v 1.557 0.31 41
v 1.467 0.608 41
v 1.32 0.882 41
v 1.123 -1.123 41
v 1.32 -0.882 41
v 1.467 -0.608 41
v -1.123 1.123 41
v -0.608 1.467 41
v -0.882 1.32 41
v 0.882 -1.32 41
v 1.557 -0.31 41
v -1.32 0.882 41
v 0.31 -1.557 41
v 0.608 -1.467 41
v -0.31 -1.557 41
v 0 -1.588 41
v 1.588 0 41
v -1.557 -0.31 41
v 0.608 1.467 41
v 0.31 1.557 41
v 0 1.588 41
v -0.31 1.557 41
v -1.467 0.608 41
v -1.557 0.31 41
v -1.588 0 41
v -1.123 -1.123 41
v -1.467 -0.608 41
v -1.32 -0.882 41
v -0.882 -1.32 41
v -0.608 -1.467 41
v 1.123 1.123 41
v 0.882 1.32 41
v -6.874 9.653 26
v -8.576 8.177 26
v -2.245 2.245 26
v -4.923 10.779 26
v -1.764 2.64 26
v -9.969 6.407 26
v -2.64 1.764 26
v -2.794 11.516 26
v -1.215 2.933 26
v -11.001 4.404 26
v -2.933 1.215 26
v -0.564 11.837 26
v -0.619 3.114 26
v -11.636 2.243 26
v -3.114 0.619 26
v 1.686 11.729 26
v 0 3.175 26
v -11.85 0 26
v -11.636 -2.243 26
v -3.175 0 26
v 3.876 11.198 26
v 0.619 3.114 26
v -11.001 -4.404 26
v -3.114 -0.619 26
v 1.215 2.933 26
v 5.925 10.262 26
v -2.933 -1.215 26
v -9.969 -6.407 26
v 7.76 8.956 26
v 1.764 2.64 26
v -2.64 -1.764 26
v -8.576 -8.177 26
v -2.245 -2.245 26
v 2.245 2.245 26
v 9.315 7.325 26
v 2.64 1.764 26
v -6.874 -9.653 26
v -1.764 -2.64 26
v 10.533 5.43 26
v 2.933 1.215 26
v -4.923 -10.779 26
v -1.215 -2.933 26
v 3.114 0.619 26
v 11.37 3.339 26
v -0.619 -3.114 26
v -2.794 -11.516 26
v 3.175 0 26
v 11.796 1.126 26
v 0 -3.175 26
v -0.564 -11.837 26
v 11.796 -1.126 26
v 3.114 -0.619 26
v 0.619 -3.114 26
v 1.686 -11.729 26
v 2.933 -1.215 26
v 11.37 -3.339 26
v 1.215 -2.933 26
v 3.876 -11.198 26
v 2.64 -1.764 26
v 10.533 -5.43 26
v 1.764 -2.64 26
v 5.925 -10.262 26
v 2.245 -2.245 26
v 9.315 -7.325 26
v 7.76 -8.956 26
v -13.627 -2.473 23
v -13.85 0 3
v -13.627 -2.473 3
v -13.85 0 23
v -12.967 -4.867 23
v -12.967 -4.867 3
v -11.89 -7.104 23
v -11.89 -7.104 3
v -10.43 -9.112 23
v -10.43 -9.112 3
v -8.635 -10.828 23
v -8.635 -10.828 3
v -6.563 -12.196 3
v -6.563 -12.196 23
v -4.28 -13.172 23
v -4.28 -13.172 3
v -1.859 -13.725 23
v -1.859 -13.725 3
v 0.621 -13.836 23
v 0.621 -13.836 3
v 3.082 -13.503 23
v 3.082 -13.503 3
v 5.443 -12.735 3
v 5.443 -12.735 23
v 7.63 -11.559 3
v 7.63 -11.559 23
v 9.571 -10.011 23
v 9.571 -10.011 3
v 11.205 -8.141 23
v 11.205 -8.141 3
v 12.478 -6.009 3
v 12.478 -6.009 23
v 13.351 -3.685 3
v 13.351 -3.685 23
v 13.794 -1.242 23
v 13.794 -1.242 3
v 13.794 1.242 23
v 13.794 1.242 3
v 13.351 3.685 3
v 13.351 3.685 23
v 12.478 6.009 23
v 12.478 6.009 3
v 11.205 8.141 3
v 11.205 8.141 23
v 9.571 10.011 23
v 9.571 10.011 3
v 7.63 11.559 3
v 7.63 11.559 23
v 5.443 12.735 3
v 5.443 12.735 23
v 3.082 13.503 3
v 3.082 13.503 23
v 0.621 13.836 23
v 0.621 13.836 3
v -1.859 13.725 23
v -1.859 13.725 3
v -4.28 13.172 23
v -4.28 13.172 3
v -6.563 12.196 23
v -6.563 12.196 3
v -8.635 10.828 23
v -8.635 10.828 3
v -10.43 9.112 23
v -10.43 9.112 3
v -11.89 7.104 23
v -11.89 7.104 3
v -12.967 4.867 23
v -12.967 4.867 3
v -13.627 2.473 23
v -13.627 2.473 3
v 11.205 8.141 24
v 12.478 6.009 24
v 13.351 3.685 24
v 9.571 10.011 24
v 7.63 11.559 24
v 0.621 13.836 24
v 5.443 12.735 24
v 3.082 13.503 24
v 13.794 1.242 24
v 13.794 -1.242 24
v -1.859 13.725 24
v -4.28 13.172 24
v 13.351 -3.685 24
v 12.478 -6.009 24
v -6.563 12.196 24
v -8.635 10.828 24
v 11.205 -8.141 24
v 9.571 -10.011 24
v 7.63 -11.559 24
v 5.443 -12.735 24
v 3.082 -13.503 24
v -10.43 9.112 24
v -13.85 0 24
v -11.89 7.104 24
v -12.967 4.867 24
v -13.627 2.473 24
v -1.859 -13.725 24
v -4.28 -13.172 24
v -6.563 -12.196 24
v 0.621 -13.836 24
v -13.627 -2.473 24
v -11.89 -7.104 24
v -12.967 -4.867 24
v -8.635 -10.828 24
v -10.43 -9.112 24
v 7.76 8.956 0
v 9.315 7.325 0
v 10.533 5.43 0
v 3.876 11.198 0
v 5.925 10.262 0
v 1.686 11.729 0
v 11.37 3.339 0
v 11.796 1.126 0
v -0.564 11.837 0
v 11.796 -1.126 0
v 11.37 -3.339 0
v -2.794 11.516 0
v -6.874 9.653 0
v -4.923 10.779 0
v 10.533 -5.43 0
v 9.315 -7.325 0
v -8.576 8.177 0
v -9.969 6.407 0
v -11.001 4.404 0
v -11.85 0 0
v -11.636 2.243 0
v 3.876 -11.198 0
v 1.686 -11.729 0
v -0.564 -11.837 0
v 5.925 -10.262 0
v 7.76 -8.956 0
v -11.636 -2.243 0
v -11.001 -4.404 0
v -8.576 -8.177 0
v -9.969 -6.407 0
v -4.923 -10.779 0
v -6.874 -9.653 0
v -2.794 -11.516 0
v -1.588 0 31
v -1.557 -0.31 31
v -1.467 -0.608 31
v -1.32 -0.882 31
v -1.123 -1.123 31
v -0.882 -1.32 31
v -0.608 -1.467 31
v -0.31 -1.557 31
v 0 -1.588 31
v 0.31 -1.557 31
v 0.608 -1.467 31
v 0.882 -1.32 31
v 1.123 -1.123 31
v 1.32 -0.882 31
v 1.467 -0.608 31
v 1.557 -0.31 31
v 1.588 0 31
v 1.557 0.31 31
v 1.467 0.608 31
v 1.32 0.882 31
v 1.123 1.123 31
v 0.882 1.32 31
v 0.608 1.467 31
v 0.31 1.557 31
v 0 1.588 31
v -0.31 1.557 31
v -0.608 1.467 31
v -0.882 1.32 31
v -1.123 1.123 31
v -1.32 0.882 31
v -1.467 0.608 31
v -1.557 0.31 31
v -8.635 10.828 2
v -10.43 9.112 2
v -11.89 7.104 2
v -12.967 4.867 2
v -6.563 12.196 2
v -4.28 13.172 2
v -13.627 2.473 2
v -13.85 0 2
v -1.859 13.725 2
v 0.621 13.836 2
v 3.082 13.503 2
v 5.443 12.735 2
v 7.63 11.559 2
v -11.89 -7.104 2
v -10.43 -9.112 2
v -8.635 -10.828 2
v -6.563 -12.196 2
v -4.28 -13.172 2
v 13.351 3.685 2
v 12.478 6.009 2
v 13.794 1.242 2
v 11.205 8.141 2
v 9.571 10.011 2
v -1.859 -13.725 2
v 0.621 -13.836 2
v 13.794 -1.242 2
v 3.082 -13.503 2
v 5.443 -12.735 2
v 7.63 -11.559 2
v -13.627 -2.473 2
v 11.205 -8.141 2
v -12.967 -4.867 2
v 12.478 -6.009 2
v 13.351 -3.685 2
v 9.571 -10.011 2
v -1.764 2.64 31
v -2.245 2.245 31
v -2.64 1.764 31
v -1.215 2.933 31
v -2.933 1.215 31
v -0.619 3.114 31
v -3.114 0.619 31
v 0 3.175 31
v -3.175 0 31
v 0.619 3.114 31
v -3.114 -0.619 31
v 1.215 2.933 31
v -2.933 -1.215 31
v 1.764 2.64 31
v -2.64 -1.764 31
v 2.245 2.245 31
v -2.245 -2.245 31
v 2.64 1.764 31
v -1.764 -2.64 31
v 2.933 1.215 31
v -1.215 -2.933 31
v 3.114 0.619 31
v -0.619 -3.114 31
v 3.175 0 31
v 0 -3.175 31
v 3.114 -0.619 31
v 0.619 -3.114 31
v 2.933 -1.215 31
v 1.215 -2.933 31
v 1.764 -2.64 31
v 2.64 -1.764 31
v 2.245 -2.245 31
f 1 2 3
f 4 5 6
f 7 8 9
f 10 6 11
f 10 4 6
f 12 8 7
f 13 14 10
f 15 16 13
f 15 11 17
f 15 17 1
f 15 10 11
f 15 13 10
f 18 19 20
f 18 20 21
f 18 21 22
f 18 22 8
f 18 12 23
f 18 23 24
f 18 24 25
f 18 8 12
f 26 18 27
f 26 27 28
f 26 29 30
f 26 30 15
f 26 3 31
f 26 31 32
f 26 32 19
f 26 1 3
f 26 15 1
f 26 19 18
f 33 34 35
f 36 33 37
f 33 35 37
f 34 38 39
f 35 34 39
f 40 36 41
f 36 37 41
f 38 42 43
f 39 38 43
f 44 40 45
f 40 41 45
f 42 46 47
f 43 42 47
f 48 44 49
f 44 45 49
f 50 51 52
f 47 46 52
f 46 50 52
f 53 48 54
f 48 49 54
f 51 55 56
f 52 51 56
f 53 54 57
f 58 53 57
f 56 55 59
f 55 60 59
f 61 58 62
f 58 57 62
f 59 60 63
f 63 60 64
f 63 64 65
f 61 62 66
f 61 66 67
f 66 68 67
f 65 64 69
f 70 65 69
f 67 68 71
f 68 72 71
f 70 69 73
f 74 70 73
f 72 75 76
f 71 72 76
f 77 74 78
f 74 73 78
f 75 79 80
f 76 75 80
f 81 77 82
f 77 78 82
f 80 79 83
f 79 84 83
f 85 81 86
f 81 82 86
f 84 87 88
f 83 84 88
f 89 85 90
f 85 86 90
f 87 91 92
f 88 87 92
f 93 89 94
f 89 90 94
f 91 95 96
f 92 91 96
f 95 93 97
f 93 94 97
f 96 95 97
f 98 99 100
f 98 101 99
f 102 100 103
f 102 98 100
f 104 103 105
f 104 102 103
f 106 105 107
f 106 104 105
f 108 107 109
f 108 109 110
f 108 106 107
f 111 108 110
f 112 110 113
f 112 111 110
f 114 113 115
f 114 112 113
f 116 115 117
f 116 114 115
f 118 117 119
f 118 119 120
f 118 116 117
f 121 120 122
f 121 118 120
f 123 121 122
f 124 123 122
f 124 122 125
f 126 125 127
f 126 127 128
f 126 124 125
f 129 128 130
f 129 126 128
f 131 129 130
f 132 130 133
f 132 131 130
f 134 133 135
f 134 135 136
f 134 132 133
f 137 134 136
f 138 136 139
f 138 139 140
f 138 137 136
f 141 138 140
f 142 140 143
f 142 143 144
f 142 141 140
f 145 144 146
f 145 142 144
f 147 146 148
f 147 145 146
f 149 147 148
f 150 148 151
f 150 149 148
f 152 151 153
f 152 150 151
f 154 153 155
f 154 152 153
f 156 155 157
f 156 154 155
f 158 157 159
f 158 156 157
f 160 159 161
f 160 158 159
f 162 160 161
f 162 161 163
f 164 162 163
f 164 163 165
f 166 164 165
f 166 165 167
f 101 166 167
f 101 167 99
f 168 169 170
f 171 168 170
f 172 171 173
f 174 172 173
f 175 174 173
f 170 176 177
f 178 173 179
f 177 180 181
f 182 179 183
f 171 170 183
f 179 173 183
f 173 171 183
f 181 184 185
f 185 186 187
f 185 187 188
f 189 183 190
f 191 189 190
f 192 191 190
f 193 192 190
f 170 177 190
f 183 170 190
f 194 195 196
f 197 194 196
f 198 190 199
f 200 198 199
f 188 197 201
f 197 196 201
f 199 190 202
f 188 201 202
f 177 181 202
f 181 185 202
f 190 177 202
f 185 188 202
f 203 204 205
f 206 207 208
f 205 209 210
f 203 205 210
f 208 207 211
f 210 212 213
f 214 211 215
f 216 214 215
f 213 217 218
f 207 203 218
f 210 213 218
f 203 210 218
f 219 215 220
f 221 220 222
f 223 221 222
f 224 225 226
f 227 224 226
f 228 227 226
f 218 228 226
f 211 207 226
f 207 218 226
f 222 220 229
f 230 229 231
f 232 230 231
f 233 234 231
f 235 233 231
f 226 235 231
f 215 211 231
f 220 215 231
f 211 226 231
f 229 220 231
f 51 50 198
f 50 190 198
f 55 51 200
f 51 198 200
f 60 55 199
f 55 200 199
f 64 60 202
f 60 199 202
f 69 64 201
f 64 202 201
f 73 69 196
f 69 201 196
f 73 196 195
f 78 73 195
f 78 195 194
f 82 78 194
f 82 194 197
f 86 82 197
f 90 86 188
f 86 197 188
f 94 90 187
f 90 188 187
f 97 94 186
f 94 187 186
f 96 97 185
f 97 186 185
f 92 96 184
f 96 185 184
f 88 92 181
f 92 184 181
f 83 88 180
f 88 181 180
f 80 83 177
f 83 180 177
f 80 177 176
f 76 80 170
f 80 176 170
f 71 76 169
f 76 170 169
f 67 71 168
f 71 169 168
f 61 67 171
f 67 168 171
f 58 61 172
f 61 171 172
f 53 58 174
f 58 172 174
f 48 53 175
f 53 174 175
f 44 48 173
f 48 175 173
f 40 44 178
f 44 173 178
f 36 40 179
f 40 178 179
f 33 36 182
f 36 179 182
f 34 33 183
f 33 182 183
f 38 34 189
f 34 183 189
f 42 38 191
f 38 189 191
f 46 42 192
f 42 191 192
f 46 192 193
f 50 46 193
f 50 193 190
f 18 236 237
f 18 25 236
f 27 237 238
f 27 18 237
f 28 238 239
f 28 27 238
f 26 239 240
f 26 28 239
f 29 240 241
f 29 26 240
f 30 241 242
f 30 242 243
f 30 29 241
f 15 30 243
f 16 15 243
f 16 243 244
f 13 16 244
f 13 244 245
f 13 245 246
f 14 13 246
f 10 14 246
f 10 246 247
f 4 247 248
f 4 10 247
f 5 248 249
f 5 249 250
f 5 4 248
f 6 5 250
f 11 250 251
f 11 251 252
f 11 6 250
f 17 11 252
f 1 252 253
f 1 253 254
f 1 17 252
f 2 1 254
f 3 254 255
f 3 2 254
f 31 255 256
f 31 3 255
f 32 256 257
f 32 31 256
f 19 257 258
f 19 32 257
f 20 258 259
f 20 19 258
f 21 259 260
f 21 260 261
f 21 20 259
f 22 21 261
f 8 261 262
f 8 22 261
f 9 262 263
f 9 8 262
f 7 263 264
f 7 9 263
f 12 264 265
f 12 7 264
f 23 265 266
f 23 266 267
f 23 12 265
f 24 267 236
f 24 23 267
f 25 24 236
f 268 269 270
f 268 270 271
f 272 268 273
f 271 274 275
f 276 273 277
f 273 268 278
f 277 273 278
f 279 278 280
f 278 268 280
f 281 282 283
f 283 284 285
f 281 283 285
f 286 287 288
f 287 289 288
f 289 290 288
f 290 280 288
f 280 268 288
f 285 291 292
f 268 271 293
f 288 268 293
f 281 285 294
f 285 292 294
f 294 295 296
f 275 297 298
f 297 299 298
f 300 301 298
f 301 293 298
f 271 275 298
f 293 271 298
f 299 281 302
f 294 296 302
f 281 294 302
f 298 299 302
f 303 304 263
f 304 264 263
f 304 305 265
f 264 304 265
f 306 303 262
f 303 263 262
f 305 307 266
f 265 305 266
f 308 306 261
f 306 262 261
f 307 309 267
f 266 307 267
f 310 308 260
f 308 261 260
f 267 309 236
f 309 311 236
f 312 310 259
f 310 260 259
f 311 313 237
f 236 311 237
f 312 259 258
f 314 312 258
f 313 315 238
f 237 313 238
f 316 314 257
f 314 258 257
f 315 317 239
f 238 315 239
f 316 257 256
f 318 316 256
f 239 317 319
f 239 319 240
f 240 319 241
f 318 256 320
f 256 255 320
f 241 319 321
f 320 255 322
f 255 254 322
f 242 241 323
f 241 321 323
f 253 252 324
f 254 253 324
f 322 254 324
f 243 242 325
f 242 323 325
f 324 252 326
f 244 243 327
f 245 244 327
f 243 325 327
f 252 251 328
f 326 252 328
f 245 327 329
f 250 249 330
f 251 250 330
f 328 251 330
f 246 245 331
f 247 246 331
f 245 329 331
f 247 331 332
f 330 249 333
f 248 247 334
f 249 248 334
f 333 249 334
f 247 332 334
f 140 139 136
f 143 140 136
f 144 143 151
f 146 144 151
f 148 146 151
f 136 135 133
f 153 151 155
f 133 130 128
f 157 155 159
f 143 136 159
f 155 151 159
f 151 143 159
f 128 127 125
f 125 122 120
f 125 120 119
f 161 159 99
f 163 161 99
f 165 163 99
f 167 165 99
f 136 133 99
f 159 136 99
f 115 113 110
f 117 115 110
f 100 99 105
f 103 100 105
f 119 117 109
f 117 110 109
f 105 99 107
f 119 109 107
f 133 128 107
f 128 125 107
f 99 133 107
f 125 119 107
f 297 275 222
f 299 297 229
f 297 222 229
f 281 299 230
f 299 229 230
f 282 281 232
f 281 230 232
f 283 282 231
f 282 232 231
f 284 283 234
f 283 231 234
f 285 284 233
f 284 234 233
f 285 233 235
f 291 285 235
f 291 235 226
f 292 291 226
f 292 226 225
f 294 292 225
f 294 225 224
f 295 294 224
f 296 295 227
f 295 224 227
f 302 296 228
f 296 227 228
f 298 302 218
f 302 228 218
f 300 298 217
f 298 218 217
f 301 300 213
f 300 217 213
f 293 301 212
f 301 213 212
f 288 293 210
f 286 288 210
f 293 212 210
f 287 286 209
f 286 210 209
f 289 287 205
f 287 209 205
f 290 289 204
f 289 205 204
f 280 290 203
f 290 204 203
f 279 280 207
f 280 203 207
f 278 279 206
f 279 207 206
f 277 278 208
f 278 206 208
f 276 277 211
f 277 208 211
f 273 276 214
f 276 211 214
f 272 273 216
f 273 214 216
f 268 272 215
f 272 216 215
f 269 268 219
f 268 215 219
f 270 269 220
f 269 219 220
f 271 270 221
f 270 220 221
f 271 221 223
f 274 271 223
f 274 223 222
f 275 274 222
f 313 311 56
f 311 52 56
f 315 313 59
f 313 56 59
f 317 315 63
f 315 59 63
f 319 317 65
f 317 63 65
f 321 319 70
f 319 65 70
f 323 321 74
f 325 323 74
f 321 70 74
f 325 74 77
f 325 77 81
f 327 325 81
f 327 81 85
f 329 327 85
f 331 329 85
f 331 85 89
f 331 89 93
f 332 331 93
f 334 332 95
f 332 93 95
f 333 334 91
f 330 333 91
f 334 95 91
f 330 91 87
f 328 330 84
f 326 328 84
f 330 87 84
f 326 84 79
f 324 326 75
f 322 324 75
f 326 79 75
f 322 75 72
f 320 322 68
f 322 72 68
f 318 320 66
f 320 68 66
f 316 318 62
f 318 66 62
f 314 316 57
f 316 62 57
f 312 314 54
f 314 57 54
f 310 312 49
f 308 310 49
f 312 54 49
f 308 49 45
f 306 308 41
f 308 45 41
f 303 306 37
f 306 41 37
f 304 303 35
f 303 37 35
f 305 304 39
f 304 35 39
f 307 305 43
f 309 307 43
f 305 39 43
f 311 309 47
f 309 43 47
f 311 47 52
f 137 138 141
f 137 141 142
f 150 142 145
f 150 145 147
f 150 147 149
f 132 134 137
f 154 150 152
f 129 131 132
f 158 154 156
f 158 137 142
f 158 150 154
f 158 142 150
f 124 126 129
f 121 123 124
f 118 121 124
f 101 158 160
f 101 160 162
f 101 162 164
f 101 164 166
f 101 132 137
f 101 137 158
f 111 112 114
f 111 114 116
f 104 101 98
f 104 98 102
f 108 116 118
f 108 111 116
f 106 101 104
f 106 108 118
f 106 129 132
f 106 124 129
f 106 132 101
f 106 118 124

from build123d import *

# Parameters (mm, degrees)
F0_W   = 13.85
F0_H   = 20
F0_W_2 = 1.5875
F0_H_2 = 10


with BuildPart() as f1:
    # F0 (on Front) → F1 (revolve)
    with BuildSketch(Plane.XZ):
        Polygon((-11.85, 0), (0, 0), (0, 2), (-13.85, 2), align=None)
        with Locations((-6.925, 13)):
            Rectangle(F0_W, F0_H)
        Polygon((-13.85, 24), (0, 24), (0, 26), (-3.175, 26), (-11.85, 26), align=None)
        Polygon((-3.175, 26), (0, 26), (0, 31), (-1.5875, 31), (-3.175, 31), align=None)
        with Locations((-0.79375, 36)):
            Rectangle(F0_W_2, F0_H_2)
    revolve(axis=Axis((0, 0, 13), (0, 0, 1)))


solid = f1.part
